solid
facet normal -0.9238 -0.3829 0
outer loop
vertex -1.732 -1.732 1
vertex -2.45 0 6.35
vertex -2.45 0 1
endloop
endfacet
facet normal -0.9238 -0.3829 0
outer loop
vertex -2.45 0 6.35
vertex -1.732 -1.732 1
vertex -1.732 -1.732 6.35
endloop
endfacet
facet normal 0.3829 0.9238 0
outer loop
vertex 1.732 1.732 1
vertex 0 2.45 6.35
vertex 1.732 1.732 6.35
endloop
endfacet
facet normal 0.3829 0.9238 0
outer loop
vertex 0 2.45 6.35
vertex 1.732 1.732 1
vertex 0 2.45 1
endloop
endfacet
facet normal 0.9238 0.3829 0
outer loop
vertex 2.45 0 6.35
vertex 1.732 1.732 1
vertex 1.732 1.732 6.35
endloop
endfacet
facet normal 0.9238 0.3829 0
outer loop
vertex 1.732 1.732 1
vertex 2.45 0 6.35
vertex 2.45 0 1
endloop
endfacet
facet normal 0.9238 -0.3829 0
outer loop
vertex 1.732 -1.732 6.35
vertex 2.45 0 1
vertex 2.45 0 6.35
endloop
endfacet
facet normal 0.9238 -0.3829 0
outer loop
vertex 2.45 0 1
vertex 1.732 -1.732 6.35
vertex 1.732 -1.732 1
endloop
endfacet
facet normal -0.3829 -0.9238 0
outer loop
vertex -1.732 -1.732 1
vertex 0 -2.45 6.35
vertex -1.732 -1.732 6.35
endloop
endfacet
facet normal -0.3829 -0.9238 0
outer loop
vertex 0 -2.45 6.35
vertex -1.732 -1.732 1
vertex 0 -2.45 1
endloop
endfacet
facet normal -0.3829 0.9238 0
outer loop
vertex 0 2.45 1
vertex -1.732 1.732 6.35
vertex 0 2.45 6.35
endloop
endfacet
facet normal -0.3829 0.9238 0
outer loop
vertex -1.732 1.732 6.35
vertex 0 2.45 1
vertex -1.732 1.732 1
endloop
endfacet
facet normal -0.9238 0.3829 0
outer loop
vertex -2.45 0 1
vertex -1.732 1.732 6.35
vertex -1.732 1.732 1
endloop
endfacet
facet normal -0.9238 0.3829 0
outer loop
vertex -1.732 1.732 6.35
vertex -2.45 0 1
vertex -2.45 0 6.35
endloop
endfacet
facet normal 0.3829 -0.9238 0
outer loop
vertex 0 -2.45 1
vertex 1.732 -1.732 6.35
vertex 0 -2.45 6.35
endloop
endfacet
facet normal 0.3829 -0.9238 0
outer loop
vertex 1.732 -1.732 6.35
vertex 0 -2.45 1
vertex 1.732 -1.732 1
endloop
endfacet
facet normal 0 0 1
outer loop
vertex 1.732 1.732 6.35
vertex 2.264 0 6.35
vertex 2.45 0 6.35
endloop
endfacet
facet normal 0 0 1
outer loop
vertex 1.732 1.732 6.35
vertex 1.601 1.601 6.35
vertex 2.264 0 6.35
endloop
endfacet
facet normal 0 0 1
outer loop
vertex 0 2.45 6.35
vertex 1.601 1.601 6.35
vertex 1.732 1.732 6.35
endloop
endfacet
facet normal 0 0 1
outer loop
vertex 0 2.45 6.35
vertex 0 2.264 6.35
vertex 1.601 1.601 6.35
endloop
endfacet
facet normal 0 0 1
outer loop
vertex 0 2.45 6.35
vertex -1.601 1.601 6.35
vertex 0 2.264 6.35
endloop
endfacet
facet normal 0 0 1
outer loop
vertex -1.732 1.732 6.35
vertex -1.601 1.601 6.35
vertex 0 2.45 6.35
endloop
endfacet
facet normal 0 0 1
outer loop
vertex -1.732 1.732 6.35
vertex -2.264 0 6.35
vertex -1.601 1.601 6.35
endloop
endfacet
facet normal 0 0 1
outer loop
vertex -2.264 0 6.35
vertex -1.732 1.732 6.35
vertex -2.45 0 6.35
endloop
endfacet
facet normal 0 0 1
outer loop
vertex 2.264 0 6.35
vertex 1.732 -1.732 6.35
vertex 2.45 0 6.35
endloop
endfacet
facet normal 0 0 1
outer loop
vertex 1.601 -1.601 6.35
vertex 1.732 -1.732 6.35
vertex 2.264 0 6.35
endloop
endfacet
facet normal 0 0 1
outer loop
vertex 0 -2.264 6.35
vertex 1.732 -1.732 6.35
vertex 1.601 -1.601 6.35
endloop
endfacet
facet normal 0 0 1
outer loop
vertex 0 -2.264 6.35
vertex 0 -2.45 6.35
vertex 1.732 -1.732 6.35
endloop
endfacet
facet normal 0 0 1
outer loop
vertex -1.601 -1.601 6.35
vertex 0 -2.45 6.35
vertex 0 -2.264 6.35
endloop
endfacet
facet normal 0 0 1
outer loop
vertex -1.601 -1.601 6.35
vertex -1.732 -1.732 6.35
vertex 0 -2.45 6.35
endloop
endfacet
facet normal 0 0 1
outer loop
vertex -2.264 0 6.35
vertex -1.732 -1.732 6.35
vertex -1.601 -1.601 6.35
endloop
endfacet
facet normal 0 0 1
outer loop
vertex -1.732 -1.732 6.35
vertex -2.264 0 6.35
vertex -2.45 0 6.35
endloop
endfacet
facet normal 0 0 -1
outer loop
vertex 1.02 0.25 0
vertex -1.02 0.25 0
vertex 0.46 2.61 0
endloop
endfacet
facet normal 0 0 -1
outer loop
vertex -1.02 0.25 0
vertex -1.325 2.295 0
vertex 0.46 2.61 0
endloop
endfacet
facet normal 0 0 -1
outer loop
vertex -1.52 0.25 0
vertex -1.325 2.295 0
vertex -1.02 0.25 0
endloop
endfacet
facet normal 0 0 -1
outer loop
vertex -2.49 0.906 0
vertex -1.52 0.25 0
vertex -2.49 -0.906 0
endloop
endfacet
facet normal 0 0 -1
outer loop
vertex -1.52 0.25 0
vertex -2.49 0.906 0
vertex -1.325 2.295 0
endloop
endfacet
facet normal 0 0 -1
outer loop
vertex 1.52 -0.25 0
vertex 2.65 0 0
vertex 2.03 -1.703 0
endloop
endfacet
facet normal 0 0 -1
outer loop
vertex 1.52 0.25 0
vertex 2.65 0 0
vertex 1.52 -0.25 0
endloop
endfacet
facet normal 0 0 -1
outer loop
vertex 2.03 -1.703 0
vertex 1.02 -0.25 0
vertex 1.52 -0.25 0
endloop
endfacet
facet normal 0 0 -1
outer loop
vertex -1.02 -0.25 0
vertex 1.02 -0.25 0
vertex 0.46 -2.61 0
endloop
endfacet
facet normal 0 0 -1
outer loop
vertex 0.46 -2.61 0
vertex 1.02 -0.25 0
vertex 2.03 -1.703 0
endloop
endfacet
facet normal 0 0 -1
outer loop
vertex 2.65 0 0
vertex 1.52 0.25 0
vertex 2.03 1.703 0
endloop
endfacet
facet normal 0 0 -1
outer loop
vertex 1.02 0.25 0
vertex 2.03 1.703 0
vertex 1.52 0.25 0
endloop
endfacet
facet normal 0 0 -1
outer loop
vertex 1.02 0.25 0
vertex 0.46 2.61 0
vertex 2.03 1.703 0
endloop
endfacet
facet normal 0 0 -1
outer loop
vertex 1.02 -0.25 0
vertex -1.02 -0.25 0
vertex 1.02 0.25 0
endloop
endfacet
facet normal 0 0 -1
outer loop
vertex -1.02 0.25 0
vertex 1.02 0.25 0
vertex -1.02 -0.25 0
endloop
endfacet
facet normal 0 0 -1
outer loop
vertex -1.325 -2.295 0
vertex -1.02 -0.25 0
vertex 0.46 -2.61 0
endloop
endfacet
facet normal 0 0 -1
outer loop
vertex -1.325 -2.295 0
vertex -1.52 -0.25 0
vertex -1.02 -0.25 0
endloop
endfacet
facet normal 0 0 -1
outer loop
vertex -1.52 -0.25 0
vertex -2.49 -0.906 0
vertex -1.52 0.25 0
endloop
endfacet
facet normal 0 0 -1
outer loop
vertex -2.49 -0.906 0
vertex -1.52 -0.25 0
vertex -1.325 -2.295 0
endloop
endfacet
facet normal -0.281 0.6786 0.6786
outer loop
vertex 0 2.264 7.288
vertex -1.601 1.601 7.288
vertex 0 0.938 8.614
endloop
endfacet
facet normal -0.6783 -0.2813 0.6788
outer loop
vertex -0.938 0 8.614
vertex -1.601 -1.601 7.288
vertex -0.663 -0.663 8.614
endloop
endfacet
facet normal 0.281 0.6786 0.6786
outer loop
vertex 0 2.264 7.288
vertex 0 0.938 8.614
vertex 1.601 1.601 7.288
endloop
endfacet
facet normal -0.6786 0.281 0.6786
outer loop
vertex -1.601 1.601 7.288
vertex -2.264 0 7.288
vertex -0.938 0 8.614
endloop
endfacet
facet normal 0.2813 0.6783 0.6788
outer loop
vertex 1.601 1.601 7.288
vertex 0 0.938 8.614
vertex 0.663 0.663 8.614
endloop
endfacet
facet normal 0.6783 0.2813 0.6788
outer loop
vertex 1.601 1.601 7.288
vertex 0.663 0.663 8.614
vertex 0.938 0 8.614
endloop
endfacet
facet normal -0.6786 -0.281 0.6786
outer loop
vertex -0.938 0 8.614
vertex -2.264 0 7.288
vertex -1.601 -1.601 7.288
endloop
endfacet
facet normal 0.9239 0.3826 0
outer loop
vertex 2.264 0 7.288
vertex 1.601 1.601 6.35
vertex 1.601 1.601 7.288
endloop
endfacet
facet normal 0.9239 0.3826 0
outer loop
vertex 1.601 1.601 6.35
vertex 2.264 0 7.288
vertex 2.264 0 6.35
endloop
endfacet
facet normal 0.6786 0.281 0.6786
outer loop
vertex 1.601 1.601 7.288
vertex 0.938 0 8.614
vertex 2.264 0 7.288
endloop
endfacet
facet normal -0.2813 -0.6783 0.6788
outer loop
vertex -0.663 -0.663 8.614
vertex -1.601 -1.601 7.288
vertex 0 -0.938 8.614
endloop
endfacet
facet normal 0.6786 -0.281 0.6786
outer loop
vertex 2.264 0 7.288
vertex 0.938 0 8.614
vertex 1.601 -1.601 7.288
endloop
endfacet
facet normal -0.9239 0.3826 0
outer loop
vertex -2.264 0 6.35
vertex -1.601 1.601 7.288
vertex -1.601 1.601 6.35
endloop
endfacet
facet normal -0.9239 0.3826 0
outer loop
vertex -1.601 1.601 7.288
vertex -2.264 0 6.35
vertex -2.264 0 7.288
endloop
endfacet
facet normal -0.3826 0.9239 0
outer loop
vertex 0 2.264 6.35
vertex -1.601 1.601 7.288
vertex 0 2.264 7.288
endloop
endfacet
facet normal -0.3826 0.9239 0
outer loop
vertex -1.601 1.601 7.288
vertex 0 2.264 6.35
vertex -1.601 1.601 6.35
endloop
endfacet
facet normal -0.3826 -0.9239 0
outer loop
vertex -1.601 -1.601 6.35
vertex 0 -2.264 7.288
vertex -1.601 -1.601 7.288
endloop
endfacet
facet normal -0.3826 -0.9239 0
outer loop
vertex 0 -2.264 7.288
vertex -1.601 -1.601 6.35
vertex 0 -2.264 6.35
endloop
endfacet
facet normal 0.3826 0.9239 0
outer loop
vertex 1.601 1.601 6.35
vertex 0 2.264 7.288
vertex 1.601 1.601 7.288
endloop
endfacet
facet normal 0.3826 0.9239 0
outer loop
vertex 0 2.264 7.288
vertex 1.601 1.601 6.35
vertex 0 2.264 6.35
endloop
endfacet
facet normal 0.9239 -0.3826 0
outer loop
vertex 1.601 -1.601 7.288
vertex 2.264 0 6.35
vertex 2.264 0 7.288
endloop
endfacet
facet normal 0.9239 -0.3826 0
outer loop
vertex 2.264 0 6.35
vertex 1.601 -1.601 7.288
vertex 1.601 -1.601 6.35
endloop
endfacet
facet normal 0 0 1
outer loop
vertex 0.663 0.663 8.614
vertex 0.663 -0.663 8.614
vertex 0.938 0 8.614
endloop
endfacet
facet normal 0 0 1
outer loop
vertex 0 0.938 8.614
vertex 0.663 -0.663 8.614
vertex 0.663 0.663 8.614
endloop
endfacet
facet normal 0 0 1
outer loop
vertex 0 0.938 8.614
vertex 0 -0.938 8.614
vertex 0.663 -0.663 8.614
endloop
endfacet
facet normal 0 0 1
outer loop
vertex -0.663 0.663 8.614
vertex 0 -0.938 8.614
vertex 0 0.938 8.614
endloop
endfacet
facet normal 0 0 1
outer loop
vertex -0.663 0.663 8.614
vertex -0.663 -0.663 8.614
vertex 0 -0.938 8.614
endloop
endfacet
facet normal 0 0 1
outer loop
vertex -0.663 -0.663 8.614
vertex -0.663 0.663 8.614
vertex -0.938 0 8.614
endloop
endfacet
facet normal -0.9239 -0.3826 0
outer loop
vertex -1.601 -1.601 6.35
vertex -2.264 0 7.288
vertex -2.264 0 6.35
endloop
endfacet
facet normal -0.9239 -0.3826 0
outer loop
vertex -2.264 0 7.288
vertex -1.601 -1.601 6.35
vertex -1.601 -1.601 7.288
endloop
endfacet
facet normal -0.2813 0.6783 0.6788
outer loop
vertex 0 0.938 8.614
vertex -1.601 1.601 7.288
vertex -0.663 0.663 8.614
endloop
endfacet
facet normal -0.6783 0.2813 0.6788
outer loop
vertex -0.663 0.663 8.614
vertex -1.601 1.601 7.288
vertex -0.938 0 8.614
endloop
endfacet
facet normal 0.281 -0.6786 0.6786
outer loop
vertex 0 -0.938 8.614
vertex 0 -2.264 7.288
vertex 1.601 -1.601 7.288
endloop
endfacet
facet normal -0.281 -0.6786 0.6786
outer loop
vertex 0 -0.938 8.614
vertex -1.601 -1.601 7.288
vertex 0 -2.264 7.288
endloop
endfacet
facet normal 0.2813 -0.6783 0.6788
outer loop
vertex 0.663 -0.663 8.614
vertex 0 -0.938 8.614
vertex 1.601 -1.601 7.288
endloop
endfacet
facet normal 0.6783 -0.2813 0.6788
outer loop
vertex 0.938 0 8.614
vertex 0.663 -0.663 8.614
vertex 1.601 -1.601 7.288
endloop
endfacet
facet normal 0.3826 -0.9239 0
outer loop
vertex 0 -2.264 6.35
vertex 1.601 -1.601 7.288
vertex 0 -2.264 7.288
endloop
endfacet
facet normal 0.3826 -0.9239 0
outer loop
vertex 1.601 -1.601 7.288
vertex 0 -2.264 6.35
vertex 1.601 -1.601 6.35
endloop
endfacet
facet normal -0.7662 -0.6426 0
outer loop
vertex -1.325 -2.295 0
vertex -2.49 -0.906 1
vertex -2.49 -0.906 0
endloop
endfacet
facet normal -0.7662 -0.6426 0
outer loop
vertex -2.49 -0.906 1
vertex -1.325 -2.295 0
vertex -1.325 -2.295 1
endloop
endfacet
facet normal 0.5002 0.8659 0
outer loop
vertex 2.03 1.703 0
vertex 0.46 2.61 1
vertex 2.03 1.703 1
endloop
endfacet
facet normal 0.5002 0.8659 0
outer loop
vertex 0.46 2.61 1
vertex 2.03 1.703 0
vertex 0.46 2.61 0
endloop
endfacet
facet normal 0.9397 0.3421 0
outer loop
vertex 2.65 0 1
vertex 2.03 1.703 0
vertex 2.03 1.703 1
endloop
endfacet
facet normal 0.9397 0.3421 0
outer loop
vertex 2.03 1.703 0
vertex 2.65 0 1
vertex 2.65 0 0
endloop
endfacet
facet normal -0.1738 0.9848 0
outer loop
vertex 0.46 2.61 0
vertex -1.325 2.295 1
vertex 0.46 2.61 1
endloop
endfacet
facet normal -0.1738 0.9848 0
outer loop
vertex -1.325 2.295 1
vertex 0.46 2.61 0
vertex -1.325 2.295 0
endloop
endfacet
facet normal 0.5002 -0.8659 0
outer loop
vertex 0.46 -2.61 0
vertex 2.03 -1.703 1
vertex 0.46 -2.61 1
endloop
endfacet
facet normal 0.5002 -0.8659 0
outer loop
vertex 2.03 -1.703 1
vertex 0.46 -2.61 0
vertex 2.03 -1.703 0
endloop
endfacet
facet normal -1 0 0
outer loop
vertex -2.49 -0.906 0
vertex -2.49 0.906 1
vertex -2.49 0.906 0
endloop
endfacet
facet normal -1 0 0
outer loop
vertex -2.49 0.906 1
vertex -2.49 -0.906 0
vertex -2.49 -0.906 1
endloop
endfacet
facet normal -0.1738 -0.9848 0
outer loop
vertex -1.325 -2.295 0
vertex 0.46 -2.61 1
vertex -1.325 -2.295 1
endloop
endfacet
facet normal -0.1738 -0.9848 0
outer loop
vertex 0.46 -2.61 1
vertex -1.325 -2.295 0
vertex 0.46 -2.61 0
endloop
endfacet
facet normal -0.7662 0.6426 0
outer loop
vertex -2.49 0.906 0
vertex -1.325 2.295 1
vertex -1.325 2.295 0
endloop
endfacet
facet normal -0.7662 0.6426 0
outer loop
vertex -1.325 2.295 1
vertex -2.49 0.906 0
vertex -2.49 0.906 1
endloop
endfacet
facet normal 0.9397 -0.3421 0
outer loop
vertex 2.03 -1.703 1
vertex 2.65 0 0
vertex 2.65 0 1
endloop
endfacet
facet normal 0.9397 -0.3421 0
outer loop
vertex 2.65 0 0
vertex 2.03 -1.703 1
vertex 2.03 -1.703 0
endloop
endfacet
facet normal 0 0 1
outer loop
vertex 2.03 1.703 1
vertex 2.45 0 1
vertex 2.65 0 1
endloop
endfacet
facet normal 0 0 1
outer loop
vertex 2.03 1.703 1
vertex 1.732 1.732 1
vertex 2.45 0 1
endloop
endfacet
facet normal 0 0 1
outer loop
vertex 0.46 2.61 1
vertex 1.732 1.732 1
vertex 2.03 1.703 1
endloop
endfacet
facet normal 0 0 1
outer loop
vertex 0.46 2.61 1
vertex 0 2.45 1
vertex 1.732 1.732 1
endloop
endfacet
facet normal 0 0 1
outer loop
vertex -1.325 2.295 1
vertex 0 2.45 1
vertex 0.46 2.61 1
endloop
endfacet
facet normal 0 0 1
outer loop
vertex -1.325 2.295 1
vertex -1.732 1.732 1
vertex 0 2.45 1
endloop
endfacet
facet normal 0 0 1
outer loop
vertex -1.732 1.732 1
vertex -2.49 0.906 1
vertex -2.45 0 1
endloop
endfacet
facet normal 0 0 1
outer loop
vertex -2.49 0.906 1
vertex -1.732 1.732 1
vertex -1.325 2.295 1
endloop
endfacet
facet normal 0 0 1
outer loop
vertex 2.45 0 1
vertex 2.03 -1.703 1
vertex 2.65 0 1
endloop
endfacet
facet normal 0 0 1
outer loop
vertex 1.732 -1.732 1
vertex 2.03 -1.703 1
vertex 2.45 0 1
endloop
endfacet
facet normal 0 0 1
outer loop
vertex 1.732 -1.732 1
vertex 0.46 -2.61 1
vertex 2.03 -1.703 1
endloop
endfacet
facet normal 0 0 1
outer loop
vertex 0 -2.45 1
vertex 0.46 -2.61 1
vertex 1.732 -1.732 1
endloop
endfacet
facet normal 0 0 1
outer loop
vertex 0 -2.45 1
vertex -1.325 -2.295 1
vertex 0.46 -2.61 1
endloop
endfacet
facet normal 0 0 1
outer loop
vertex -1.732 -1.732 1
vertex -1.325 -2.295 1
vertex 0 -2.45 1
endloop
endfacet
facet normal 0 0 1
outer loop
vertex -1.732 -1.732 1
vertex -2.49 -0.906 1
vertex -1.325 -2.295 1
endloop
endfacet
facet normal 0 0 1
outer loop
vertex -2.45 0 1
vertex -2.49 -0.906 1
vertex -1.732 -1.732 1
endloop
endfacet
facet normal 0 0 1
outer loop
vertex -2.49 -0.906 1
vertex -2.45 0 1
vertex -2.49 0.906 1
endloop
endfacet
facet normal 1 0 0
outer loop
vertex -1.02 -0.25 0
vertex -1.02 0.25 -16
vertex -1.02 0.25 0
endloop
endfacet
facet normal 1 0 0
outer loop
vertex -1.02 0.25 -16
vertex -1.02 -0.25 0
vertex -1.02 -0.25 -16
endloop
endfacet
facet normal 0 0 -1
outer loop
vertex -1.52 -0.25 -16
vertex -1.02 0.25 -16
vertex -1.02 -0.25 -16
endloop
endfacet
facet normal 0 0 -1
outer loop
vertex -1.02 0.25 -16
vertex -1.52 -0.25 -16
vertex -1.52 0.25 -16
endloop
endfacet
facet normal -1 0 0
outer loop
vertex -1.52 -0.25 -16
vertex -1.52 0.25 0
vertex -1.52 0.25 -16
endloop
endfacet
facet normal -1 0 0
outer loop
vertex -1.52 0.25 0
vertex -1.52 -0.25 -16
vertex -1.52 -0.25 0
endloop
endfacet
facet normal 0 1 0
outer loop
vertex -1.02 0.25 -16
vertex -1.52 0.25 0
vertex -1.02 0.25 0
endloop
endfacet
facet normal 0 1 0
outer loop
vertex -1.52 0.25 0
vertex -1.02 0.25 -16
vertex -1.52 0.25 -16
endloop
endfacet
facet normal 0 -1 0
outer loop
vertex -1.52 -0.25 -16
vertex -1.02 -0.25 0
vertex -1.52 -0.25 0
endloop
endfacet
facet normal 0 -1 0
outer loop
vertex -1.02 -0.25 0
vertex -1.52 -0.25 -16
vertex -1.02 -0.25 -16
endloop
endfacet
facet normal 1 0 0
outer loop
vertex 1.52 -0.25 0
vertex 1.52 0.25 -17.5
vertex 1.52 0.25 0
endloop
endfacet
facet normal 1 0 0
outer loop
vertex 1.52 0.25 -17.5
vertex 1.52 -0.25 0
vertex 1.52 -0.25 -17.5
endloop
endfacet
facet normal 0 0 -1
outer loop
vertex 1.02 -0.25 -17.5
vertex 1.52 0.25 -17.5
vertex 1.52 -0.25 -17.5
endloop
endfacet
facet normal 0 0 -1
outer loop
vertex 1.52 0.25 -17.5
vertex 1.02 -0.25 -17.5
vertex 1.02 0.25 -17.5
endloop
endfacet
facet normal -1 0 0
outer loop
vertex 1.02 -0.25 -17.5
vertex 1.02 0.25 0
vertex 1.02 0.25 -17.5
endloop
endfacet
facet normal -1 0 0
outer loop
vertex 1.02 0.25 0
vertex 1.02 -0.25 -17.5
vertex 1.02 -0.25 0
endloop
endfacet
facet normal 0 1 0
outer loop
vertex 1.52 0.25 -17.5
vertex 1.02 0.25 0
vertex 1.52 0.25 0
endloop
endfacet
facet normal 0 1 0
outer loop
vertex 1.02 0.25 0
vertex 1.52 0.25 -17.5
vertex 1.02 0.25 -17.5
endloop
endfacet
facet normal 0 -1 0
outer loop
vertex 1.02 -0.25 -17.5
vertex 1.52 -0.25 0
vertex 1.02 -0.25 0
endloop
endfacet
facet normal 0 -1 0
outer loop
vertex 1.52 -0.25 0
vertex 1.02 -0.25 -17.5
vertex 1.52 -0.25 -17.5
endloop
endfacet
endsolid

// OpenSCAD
Diameter = 4.9;
Height = 8.8;
Base_Diameter = 5.3;
Base_Height = 1.0;

Pin_Size = 0.5;
Pin_Length = [16.0, 17.5];
Pin_Distance = 2.54;

Led("#F00A", "#888");

module Led(color = "#F00", pin_color = "#888") {
    color(color) {
        cylinder(Height - Diameter / 2, d=Diameter);
        translate([0, 0, Height - Diameter / 2])
            sphere(d = Diameter);
        cylinder(Base_Height, d = Base_Diameter);
    }

    color(pin_color) {
        for (i = [0, 1]) {
            translate([Pin_Distance / 2 * (i == 0 ? -1 : 1), 0, -Pin_Length[i] / 2])
                cube([Pin_Size, Pin_Size, Pin_Length[i]], center=true);
        }
    }
}
